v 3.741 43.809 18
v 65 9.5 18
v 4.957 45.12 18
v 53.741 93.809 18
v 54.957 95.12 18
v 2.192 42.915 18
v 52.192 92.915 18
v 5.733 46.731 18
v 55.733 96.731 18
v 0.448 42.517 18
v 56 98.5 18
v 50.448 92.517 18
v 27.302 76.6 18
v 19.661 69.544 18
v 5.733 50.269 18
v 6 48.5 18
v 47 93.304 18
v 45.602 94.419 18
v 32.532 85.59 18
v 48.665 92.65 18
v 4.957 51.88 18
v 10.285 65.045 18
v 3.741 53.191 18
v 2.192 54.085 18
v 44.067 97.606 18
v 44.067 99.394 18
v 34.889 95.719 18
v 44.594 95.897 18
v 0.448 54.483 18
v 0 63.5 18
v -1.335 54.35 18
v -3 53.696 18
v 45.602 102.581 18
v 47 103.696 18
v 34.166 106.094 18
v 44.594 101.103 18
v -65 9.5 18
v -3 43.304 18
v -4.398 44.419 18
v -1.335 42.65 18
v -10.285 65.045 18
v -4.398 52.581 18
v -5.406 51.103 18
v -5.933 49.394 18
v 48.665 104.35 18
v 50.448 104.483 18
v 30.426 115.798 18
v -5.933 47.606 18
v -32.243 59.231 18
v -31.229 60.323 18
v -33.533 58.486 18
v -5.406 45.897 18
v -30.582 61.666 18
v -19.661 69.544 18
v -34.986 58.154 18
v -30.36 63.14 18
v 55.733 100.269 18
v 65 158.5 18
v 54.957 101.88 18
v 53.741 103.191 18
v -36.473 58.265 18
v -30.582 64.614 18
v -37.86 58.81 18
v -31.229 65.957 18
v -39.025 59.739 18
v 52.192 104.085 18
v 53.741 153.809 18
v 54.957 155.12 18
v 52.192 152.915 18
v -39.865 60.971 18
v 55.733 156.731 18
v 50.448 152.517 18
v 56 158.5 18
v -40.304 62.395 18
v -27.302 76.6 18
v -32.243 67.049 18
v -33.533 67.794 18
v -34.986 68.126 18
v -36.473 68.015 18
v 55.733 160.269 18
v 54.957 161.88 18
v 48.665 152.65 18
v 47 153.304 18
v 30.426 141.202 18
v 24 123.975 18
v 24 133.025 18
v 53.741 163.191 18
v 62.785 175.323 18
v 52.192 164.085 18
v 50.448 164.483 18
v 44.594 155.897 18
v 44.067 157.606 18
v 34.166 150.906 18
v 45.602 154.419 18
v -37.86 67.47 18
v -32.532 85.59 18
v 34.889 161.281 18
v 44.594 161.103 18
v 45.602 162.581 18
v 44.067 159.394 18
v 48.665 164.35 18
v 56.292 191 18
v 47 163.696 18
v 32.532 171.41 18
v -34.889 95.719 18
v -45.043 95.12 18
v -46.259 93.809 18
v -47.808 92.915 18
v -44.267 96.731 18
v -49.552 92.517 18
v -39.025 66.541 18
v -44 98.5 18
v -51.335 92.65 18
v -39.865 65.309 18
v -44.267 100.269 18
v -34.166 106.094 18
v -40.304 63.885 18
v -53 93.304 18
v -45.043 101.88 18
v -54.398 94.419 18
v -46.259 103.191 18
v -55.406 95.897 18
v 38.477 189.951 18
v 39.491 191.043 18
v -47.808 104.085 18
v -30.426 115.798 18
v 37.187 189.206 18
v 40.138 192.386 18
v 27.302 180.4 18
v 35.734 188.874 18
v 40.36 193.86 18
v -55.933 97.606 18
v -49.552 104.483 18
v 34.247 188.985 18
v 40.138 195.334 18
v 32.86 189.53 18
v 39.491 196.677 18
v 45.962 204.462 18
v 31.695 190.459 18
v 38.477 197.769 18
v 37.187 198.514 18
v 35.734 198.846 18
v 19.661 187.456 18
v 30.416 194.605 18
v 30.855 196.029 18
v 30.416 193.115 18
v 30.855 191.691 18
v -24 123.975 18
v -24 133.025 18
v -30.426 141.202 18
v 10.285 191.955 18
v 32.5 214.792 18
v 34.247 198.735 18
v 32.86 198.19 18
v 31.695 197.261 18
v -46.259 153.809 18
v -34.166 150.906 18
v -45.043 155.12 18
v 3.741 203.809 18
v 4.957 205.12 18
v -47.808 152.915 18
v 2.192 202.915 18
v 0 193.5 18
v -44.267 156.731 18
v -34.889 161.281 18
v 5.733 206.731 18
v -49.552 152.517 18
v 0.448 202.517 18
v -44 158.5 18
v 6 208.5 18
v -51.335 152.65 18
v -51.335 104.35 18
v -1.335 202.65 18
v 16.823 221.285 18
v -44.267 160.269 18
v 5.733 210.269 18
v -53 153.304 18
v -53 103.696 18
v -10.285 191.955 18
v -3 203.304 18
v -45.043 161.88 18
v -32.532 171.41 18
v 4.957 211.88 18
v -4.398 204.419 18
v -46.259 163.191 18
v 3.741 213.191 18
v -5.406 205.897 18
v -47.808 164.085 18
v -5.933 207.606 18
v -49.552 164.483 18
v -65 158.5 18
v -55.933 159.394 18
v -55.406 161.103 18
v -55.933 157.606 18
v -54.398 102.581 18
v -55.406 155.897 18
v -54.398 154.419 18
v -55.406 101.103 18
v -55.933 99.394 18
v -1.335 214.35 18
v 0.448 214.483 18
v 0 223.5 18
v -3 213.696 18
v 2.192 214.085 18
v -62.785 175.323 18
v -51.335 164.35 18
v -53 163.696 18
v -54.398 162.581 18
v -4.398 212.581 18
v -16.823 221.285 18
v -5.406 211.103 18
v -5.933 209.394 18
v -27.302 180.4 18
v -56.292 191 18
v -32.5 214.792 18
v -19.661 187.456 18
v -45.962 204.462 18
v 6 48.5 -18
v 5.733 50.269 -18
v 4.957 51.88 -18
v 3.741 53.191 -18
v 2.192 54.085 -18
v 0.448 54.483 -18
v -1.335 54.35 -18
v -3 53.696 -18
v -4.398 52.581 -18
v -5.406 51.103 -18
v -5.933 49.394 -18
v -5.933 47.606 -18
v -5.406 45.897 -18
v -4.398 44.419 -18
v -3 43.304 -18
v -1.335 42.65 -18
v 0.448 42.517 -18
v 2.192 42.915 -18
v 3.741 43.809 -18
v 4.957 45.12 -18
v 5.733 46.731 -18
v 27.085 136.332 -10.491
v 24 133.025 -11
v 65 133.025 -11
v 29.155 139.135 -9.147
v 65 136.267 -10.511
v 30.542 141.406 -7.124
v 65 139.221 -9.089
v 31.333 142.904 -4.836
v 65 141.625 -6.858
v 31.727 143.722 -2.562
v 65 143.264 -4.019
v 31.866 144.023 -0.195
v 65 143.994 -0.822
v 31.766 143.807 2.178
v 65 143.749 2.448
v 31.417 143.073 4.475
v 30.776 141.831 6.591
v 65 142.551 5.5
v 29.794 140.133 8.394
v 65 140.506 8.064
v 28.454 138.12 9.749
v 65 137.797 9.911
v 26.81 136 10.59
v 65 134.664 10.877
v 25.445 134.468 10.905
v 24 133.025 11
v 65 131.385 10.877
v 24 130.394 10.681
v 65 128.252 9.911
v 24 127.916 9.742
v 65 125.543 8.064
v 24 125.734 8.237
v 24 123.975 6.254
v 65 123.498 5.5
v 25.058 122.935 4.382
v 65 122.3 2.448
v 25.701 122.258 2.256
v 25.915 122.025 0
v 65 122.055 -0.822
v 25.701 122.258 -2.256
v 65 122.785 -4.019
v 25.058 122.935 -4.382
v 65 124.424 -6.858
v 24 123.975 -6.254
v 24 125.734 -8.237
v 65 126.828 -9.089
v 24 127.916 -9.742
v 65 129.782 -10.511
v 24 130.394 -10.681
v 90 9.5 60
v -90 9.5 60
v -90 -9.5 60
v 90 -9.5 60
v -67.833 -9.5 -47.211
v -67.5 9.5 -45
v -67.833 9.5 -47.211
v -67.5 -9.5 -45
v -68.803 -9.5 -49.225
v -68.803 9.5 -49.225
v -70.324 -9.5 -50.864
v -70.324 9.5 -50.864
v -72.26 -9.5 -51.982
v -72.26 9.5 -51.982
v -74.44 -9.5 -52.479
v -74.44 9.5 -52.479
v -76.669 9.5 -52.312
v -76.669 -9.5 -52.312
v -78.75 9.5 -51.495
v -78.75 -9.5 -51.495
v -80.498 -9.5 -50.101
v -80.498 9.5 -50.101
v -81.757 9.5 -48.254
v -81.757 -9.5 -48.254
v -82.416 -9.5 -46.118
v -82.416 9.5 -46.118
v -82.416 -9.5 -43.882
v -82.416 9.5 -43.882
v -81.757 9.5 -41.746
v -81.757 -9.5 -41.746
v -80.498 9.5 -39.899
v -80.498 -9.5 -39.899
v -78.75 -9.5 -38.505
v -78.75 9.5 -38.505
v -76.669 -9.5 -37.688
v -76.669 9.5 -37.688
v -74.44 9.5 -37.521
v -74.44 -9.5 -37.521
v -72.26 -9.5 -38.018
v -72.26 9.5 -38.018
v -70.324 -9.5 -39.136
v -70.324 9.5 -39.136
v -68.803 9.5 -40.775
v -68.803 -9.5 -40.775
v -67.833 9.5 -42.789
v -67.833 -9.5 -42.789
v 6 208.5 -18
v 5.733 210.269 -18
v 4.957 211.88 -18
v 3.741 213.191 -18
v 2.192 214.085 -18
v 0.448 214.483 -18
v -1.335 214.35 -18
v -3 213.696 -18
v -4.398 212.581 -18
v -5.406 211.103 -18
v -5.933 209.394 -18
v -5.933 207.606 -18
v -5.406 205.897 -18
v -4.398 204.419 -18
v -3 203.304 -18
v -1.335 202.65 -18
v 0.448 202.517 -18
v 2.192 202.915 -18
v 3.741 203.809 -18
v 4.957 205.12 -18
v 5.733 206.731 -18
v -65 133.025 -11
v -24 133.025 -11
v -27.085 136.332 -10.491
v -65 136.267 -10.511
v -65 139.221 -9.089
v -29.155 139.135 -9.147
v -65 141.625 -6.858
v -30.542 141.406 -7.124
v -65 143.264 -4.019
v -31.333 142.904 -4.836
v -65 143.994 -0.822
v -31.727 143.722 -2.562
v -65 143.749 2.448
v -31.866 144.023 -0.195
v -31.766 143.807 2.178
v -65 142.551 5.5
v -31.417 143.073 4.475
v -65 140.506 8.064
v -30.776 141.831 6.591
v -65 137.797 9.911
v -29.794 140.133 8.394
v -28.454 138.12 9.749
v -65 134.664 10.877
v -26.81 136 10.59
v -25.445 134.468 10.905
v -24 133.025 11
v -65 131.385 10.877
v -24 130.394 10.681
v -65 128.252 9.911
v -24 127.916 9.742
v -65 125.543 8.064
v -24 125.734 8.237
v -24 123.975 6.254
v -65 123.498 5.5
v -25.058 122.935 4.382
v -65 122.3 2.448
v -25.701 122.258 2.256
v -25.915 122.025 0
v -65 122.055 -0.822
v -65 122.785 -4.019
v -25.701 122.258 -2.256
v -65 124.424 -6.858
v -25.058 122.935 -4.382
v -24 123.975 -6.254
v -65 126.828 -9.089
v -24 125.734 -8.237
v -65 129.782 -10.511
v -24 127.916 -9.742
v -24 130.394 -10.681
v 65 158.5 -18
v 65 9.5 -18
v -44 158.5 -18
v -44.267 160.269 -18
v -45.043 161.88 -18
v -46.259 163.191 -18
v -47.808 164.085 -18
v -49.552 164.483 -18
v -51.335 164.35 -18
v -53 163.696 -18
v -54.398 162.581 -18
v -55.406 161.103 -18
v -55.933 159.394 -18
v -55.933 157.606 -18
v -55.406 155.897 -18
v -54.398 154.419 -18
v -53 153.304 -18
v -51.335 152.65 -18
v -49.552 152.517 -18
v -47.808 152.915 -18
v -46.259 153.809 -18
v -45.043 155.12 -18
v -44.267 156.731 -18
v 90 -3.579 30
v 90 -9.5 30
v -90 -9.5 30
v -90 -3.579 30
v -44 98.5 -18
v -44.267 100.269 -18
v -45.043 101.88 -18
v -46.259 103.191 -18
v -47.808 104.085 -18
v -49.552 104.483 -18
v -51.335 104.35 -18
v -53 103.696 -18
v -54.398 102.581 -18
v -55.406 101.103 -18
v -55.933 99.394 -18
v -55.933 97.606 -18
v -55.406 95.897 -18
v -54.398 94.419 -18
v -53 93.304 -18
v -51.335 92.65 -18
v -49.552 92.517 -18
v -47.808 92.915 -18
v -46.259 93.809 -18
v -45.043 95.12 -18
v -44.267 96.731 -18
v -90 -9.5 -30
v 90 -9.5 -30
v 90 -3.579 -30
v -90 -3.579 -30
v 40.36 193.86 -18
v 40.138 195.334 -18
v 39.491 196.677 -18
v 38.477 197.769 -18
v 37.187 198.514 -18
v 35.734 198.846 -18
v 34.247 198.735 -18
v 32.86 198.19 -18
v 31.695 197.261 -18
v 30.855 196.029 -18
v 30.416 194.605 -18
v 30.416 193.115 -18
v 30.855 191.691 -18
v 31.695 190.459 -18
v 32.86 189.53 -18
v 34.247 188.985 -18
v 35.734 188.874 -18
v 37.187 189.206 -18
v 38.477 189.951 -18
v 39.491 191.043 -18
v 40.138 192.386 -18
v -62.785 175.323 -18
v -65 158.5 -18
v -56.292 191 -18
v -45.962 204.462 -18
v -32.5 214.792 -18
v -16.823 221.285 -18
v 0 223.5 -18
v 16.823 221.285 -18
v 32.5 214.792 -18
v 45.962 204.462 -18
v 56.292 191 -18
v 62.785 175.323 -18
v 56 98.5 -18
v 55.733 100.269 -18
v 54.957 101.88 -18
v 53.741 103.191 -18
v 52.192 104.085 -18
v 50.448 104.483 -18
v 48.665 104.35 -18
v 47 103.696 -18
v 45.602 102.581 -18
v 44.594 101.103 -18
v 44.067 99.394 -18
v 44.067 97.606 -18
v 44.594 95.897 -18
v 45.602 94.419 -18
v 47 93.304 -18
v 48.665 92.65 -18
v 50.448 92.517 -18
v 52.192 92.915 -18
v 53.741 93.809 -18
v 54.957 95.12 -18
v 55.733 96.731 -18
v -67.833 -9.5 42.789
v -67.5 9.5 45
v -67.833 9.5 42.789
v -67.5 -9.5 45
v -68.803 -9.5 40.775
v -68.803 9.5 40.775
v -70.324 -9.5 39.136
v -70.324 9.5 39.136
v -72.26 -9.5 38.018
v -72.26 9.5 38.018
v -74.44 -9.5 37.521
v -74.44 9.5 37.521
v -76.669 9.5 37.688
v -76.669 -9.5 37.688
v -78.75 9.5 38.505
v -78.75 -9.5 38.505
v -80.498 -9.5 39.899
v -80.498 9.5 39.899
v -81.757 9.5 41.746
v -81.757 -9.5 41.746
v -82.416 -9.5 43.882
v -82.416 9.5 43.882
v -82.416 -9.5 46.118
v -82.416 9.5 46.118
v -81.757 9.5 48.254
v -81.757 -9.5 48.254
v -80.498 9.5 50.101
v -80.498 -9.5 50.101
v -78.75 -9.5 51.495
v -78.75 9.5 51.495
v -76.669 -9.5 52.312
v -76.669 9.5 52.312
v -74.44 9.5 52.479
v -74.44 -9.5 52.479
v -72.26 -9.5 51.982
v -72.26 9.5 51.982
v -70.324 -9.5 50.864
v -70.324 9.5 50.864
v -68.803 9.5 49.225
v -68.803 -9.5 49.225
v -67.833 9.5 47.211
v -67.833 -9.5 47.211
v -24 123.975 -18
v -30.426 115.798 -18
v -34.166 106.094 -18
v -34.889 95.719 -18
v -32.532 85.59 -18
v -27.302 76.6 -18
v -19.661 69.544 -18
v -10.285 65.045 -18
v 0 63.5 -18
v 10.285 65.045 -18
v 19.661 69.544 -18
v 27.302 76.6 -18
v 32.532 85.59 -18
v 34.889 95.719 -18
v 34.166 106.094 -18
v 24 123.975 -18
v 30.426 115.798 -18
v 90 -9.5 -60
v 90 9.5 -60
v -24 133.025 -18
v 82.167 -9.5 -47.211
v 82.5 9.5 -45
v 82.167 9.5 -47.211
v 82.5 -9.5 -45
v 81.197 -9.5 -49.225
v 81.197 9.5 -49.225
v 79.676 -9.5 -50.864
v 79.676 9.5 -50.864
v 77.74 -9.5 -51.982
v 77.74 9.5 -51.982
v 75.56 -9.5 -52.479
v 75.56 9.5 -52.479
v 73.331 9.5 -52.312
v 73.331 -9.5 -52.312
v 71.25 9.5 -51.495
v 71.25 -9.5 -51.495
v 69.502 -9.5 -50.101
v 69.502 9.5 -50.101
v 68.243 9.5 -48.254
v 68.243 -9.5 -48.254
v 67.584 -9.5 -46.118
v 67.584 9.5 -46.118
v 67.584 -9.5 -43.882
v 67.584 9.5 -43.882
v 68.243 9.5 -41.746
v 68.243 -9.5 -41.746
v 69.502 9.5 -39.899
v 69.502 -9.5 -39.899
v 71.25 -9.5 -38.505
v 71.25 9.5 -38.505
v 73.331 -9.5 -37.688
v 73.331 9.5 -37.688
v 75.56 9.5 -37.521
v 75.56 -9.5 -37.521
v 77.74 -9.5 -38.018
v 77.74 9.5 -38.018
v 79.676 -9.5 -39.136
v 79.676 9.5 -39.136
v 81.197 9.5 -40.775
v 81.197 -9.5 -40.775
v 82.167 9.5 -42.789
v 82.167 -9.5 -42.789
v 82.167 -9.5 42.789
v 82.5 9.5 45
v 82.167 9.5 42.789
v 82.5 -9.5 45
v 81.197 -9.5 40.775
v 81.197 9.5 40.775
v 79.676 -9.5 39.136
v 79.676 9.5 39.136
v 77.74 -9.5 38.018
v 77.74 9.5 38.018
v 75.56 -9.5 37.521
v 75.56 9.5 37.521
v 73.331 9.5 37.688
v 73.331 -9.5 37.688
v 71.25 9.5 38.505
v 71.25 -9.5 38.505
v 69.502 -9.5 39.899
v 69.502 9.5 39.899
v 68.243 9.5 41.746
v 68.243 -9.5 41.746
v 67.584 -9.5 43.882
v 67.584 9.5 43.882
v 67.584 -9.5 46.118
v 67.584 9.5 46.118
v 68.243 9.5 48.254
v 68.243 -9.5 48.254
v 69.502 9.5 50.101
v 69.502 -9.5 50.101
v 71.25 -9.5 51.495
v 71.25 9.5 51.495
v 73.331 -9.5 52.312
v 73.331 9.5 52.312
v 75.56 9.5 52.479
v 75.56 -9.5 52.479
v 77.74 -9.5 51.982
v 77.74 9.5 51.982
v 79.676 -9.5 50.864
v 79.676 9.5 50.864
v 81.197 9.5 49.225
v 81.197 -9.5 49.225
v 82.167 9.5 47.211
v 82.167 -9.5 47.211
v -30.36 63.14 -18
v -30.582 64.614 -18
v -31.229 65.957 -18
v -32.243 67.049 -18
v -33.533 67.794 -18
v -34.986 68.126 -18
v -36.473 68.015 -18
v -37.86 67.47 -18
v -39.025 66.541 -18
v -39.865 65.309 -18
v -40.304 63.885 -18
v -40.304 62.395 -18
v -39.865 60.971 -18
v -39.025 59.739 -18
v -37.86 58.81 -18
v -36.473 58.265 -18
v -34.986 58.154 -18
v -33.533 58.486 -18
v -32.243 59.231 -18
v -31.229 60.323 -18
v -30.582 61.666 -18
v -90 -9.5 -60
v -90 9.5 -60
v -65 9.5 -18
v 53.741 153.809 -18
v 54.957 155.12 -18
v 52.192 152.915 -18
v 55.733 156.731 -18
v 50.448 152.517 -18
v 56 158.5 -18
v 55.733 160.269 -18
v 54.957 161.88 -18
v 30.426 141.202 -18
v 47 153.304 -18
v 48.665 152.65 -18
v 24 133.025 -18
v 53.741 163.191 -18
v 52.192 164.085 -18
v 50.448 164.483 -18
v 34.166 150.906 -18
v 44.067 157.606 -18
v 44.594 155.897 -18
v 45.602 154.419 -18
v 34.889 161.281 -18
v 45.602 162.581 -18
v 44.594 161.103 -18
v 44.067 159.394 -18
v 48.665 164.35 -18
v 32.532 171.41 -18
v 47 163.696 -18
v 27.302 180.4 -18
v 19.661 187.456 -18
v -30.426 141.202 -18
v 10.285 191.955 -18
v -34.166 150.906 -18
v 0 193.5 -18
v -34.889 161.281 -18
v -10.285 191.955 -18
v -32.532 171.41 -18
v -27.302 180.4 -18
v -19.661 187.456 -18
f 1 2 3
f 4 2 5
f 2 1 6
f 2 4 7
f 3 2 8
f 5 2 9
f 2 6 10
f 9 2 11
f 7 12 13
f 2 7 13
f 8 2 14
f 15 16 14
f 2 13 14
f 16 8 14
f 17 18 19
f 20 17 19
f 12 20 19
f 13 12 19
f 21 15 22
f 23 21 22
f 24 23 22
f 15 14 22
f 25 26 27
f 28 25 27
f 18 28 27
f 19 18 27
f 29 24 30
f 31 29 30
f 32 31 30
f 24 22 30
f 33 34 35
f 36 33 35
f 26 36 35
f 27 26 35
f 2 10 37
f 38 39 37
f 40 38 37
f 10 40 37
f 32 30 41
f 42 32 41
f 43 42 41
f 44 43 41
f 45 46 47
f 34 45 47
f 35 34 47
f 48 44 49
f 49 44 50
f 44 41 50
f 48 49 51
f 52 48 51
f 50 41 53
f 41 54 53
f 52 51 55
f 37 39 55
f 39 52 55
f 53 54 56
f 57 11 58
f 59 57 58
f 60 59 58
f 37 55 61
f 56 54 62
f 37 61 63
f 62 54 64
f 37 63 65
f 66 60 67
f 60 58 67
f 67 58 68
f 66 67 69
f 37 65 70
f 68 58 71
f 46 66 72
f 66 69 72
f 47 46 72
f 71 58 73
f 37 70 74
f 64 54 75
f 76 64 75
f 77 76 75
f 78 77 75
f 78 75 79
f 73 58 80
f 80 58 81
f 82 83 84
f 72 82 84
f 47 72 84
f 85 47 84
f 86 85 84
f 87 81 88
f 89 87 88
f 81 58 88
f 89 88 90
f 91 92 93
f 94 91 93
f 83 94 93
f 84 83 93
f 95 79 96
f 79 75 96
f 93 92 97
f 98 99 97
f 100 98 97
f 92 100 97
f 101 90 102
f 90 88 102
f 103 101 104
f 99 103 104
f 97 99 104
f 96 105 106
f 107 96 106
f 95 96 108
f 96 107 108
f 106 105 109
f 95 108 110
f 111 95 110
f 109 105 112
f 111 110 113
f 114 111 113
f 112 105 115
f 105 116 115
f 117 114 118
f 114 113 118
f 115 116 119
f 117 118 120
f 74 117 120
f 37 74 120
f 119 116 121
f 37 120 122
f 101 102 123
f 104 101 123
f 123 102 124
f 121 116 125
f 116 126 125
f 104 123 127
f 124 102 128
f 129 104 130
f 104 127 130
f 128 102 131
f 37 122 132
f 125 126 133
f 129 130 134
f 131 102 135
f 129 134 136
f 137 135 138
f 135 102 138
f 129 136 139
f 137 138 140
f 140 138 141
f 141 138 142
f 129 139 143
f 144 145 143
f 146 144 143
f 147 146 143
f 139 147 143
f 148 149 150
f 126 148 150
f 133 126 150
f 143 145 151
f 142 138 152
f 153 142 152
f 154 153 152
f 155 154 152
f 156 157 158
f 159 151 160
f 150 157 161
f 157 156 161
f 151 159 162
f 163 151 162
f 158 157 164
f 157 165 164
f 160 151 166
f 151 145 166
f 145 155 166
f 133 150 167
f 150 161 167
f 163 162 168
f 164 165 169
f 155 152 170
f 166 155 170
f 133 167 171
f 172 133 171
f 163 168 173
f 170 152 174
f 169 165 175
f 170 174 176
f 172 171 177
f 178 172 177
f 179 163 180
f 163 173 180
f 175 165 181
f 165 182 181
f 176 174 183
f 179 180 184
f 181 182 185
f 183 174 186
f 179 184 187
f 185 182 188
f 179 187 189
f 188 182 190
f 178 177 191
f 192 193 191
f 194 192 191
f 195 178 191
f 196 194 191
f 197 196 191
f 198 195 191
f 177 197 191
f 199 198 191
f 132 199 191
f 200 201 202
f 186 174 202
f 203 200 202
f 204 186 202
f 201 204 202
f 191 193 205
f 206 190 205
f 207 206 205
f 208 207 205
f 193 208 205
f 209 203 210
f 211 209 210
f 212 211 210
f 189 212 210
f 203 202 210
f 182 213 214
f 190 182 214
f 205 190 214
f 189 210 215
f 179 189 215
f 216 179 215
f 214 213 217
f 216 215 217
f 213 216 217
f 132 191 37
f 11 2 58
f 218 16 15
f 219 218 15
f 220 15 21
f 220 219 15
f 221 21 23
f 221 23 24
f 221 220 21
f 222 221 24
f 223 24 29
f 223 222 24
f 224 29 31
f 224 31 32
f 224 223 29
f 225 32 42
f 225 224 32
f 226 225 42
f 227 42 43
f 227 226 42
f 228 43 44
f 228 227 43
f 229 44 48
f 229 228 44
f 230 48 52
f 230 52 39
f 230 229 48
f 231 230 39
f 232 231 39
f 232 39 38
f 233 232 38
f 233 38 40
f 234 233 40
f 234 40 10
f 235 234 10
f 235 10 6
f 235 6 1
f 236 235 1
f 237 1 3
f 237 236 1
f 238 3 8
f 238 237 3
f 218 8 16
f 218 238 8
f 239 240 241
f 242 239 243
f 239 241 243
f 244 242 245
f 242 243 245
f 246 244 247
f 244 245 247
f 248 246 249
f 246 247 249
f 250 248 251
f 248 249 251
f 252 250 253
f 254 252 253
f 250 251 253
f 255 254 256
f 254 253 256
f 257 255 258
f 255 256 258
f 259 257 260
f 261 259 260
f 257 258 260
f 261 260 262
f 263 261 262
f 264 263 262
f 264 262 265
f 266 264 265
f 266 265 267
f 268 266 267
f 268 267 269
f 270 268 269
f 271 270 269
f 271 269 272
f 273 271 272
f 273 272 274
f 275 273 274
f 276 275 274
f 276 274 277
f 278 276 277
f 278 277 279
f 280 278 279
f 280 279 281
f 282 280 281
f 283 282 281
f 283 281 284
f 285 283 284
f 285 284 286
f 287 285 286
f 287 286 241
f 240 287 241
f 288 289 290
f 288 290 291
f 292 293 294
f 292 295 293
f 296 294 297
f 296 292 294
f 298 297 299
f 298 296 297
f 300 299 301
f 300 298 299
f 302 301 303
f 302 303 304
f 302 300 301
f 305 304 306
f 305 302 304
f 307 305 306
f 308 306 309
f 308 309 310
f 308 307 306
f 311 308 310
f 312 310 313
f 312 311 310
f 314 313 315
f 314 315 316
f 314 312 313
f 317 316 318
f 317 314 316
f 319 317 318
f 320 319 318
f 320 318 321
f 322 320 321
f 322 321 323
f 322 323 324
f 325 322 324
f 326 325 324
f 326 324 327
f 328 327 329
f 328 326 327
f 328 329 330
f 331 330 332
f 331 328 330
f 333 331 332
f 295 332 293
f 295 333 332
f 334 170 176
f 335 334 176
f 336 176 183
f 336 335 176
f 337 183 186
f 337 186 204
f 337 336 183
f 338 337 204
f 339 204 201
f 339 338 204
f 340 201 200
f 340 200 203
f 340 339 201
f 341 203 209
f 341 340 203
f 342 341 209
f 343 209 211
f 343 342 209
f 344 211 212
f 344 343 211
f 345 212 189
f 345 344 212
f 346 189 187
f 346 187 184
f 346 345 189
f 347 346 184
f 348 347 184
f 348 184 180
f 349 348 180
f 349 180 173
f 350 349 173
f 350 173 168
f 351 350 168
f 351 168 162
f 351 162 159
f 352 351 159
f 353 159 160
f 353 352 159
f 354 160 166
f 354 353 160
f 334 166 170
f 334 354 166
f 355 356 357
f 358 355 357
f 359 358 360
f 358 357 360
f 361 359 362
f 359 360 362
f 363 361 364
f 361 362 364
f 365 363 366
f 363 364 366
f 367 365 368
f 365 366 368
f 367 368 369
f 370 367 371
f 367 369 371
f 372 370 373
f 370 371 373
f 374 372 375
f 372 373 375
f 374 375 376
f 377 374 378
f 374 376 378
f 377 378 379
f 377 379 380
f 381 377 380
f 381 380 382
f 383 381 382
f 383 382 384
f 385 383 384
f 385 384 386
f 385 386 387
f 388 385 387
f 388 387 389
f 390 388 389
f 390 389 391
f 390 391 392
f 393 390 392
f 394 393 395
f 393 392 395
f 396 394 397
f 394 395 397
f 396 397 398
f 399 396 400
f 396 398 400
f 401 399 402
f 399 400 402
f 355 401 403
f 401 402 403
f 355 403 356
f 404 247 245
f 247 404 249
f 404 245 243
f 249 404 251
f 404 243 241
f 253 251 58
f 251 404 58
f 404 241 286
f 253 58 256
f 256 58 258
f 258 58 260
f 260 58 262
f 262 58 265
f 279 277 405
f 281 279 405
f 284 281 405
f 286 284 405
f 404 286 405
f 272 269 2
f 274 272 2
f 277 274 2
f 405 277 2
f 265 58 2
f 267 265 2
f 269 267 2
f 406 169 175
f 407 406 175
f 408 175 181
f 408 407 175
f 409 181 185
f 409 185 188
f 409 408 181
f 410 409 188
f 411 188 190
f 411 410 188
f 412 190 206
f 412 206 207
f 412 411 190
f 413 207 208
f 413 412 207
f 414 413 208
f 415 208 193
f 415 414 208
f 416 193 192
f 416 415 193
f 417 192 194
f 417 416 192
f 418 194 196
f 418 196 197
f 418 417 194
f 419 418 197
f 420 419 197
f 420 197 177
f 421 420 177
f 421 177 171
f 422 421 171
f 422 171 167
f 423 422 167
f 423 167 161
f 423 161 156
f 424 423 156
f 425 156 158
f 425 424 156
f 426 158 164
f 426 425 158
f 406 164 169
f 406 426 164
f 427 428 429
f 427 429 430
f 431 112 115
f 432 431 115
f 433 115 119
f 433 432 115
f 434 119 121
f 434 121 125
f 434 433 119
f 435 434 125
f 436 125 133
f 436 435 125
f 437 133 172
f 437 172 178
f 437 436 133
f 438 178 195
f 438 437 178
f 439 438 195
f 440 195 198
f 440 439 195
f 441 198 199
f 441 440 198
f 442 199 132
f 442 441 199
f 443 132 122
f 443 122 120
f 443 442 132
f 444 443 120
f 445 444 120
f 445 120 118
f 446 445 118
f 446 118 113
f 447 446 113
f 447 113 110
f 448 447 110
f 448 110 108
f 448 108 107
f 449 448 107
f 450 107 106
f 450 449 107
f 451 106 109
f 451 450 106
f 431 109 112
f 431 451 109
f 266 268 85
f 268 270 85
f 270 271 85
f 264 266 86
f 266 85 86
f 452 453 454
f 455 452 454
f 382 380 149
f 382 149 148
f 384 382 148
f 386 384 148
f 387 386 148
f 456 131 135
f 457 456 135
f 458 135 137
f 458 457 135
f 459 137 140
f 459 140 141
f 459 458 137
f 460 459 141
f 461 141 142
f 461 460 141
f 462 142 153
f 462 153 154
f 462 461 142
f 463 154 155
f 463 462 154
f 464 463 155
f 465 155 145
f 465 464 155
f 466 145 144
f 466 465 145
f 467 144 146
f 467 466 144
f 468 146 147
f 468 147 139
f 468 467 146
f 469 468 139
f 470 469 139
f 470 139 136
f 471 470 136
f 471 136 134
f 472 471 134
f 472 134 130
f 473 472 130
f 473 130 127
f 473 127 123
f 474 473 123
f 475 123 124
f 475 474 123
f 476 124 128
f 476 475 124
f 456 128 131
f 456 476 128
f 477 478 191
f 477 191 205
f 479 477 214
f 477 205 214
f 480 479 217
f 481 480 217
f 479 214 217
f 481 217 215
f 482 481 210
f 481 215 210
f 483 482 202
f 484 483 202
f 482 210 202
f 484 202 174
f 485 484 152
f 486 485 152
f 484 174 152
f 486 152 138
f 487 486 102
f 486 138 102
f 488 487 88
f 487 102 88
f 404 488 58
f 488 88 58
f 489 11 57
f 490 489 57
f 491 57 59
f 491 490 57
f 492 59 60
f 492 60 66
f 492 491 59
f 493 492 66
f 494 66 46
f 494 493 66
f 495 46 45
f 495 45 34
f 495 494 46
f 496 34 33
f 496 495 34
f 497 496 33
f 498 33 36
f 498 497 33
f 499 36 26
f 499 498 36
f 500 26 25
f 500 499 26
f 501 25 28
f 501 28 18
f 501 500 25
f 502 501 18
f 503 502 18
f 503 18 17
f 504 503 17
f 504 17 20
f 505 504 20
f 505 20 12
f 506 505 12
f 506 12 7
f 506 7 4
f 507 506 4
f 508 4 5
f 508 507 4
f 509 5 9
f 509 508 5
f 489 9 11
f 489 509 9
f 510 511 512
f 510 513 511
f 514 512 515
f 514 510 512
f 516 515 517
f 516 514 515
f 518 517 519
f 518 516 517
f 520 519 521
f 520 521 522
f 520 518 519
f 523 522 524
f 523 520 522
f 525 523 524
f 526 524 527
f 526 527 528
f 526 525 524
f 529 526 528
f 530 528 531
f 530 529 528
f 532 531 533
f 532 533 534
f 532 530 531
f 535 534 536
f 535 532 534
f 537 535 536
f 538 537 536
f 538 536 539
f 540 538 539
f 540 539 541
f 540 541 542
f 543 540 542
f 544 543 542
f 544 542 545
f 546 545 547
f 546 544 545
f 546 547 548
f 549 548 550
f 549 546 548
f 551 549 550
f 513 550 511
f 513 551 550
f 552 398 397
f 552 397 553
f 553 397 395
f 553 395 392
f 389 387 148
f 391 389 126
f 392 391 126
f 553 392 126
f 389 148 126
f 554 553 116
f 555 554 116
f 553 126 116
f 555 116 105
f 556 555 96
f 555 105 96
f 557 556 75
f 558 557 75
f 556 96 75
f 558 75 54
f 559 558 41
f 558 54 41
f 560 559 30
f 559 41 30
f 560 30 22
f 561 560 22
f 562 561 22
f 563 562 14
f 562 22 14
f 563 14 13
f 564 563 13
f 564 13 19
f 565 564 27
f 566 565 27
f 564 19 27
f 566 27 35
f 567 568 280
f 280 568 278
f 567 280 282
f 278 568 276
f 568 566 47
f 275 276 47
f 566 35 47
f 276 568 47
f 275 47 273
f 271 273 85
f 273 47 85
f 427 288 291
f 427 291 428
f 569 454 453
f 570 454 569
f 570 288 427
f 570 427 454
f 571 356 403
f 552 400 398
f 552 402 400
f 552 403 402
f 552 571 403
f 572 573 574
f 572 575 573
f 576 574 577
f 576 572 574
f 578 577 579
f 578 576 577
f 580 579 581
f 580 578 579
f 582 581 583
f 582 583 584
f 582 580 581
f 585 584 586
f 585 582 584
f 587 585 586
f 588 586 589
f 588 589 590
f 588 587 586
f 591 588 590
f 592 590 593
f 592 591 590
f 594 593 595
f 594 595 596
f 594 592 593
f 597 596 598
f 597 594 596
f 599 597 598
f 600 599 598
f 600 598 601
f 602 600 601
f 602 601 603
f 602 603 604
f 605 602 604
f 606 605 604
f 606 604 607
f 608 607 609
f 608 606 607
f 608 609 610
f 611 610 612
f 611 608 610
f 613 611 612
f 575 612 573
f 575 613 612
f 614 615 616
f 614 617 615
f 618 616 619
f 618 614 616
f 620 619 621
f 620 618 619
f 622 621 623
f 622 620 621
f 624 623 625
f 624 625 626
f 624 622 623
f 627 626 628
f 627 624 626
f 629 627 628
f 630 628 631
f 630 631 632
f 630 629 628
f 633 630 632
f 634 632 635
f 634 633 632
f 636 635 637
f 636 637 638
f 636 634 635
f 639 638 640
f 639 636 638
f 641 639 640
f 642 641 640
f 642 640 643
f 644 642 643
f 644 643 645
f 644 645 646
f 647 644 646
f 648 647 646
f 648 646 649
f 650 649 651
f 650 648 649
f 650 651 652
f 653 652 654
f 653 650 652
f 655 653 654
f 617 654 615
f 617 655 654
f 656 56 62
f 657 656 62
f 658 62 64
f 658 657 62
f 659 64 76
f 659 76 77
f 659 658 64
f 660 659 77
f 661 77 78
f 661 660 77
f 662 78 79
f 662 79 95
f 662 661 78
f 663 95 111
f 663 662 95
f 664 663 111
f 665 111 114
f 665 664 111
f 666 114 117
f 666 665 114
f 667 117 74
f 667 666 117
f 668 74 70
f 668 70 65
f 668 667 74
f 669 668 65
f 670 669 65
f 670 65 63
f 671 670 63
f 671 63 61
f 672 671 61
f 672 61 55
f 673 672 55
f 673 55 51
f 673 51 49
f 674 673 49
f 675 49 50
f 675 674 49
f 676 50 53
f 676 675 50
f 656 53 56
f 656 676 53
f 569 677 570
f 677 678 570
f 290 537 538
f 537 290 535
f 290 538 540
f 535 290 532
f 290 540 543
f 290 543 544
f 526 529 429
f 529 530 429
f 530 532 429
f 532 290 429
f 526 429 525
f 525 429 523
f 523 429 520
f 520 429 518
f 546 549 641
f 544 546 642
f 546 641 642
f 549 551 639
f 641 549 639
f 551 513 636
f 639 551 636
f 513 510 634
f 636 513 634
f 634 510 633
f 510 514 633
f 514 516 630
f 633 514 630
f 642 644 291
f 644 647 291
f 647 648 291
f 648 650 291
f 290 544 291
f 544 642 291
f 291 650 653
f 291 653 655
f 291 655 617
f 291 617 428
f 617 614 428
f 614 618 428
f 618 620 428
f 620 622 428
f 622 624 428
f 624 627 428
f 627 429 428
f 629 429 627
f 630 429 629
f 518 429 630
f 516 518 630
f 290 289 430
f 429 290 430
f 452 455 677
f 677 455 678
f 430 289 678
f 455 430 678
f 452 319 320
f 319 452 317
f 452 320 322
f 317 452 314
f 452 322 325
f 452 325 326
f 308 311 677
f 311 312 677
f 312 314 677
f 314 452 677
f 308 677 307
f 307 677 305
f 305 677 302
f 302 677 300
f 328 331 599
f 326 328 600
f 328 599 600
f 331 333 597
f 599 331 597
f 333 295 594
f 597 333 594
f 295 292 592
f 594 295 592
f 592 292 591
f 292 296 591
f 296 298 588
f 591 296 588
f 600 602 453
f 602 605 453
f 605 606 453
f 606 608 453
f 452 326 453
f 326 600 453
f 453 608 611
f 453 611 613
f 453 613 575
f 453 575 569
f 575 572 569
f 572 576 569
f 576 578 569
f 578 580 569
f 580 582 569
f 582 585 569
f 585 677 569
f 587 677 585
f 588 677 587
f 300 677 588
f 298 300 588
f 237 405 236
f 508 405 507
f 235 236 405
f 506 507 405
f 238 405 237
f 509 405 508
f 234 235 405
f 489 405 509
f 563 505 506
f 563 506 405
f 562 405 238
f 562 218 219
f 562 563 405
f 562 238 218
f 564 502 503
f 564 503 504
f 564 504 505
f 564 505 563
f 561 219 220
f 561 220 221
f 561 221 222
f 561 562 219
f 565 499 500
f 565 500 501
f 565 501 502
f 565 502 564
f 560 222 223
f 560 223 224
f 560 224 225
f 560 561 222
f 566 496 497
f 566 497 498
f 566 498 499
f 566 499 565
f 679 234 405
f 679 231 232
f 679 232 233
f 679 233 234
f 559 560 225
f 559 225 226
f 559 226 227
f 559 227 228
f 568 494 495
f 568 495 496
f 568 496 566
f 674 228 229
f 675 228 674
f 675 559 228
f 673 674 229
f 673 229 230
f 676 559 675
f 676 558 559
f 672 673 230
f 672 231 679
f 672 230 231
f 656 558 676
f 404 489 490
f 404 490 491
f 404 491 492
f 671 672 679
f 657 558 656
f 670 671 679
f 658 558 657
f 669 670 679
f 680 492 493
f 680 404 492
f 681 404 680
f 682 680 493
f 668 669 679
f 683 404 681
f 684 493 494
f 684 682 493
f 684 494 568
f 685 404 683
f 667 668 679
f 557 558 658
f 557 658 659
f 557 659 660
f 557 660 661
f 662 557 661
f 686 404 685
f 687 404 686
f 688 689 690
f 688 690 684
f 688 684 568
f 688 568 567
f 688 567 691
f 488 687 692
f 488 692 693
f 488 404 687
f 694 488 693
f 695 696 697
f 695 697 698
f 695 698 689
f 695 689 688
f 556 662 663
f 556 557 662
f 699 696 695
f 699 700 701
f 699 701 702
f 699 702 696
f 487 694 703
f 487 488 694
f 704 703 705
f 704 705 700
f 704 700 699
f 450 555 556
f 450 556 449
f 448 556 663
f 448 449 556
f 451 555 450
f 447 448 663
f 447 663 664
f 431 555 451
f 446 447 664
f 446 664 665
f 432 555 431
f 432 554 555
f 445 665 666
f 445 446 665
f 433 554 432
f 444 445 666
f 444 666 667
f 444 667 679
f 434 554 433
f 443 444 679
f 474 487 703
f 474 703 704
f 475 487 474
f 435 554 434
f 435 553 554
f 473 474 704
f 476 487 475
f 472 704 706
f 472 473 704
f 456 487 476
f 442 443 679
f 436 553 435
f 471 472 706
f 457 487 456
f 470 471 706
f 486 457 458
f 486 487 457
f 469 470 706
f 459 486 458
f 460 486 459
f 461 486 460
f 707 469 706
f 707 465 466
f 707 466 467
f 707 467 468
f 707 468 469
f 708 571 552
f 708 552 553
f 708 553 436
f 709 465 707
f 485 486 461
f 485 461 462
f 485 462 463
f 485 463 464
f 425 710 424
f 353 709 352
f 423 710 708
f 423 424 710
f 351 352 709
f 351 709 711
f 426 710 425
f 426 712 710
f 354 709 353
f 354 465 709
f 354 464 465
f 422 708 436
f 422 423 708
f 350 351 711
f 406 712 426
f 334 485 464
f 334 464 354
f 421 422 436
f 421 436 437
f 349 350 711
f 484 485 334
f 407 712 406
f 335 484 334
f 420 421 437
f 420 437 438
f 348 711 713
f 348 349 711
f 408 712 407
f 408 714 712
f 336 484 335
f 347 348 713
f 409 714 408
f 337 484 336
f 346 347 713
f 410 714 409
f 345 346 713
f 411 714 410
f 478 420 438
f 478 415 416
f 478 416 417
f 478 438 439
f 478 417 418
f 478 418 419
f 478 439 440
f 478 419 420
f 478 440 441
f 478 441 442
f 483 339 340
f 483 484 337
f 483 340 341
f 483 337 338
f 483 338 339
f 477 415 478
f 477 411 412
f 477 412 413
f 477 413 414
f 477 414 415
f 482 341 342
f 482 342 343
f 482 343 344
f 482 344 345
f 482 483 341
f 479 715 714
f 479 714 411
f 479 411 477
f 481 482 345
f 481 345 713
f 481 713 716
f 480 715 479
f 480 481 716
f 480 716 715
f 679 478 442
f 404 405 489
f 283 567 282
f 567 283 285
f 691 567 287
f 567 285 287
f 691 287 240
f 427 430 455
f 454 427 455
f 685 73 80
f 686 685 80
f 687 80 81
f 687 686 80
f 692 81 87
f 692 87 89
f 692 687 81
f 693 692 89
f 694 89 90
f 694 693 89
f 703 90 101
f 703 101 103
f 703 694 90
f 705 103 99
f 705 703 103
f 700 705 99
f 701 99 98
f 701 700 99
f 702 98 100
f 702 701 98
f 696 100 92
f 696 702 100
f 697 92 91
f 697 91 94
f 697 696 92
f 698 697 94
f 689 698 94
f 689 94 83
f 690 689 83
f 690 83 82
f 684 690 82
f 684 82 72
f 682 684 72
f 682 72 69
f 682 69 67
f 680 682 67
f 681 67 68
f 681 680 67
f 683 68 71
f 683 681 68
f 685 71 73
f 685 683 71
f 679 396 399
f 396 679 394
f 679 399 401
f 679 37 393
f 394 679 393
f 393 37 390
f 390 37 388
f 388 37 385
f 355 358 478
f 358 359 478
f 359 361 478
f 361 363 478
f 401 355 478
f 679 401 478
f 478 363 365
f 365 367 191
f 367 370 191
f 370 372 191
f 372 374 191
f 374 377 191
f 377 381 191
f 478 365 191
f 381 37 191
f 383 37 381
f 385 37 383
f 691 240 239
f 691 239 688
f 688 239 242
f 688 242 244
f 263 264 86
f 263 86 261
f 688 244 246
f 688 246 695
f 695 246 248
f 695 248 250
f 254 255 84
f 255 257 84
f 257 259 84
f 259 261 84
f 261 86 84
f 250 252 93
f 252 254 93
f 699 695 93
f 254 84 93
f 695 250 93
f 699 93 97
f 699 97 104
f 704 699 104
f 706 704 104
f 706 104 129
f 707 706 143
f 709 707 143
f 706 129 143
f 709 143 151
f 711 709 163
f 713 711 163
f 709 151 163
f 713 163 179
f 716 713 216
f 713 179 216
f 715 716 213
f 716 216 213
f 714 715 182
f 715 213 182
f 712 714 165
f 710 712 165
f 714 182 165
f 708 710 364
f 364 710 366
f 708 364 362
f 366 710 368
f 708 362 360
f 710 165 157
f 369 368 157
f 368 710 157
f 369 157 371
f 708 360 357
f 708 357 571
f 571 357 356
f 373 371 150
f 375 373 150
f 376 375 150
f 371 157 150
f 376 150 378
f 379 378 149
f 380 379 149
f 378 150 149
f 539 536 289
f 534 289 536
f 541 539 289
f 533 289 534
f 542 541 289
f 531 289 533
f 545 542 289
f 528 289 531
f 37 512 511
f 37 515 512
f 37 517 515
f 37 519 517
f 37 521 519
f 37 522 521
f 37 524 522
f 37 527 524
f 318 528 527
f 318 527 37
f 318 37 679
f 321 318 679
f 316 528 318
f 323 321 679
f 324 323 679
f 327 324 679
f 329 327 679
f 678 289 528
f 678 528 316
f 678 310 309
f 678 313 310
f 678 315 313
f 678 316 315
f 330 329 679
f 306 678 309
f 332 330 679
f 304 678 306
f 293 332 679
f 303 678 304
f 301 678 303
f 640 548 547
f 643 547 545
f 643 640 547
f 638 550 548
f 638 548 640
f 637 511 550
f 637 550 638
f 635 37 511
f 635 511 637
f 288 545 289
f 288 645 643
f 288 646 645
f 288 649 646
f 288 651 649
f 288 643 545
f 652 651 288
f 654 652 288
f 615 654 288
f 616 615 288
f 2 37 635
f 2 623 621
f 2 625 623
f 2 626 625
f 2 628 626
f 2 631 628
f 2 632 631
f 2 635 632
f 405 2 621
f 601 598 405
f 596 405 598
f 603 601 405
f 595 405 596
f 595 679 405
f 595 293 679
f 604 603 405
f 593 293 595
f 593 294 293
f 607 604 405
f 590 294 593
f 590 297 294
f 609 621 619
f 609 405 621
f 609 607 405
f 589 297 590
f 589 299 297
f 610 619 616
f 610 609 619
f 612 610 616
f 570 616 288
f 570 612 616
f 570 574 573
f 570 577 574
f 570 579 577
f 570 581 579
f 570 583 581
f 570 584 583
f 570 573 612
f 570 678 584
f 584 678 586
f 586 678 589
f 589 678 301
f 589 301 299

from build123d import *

# Parameters (mm, degrees)
SKETCH2_W           = 180
SKETCH2_H           = 120
SKETCH2_R           = 7.5
BOSS_EXTRUDE1_DEPTH = 9.5
SKETCH14_R          = 6
SKETCH14_R_2        = 5
BOSS_EXTRUDE5_DEPTH = 18
SKETCH16_R          = 9
CUT_EXTRUDE6_DEPTH  = 156
SKETCH18_R          = 11
CUT_EXTRUDE7_DEPTH  = 156
SKETCH19_W          = 60
SKETCH19_H          = 11.842550856
CUT_EXTRUDE8_DEPTH  = 181


with BuildPart() as part:
    # Sketch2 → Boss-Extrude1 (new body, symmetric)
    with BuildSketch(Plane(origin=(0, 0, 0), x_dir=(1, 0, 0), z_dir=(0, 1, 0))):
        Rectangle(SKETCH2_W, SKETCH2_H)
        with Locations((-75, 45)):
            Circle(SKETCH2_R, mode=Mode.SUBTRACT)
        with Locations((75, 45)):
            Circle(SKETCH2_R, mode=Mode.SUBTRACT)
        with Locations((75, -45)):
            Circle(SKETCH2_R, mode=Mode.SUBTRACT)
        with Locations((-75, -45)):
            Circle(SKETCH2_R, mode=Mode.SUBTRACT)
    extrude(amount=BOSS_EXTRUDE1_DEPTH, both=True)

    # Sketch14 → Boss-Extrude5 (add, symmetric)
    with BuildSketch(Plane.XY):
        with BuildLine():
            Line((-65, 9.5), (-65, 158.5))
            ThreePointArc((-65, 158.5), (0, 223.5), (65, 158.5))
            Line((65, 158.5), (65, 9.5))
            Line((65, 9.5), (-65, 9.5))
        make_face()
        with Locations((0, 208.5)):
            Circle(SKETCH14_R, mode=Mode.SUBTRACT)
        with Locations((0, 48.5)):
            Circle(SKETCH14_R, mode=Mode.SUBTRACT)
        with Locations((-50, 158.5)):
            Circle(SKETCH14_R, mode=Mode.SUBTRACT)
        with Locations((-50, 98.5)):
            Circle(SKETCH14_R, mode=Mode.SUBTRACT)
        with Locations((50, 98.5)):
            Circle(SKETCH14_R, mode=Mode.SUBTRACT)
        with Locations((50, 158.5)):
            Circle(SKETCH14_R, mode=Mode.SUBTRACT)
        with Locations((-35.36, 63.14)):
            Circle(SKETCH14_R_2, mode=Mode.SUBTRACT)
        with Locations((35.36, 193.86)):
            Circle(SKETCH14_R_2, mode=Mode.SUBTRACT)
        with BuildLine():
            Line((-24, 133.024521594), (-24, 123.975478406))
            ThreePointArc((-24, 123.975478406), (0, 63.5), (24, 123.975478406))
            Line((24, 123.975478406), (24, 133.024521594))
            ThreePointArc((24, 133.024521594), (0, 193.5), (-24, 133.024521594))
        make_face(mode=Mode.SUBTRACT)
    extrude(amount=BOSS_EXTRUDE5_DEPTH, both=True)

    # Sketch16 → Cut-Extrude6 (cut, through all)
    with BuildSketch(Plane(origin=(65, 0, 0), x_dir=(0, 0, -1), z_dir=(1, 0, 0))):
        with Locations((0, 133.024521594)):
            Circle(SKETCH16_R)
    extrude(amount=-CUT_EXTRUDE6_DEPTH, mode=Mode.SUBTRACT)

    # Sketch18 → Cut-Extrude7 (cut, through all)
    with BuildSketch(Plane(origin=(65, 0, 0), x_dir=(0, 0, -1), z_dir=(1, 0, 0))):
        with Locations((0, 133.024521594)):
            Circle(SKETCH18_R)
    extrude(amount=-CUT_EXTRUDE7_DEPTH, mode=Mode.SUBTRACT)

    # Sketch19 → Cut-Extrude8 (cut, through all)
    with BuildSketch(Plane(origin=(90, 0, 0), x_dir=(0, 0, -1), z_dir=(1, 0, 0))):
        with Locations((0, -9.5)):
            Rectangle(SKETCH19_W, SKETCH19_H)
    extrude(amount=-CUT_EXTRUDE8_DEPTH, mode=Mode.SUBTRACT)


solid = part.part
